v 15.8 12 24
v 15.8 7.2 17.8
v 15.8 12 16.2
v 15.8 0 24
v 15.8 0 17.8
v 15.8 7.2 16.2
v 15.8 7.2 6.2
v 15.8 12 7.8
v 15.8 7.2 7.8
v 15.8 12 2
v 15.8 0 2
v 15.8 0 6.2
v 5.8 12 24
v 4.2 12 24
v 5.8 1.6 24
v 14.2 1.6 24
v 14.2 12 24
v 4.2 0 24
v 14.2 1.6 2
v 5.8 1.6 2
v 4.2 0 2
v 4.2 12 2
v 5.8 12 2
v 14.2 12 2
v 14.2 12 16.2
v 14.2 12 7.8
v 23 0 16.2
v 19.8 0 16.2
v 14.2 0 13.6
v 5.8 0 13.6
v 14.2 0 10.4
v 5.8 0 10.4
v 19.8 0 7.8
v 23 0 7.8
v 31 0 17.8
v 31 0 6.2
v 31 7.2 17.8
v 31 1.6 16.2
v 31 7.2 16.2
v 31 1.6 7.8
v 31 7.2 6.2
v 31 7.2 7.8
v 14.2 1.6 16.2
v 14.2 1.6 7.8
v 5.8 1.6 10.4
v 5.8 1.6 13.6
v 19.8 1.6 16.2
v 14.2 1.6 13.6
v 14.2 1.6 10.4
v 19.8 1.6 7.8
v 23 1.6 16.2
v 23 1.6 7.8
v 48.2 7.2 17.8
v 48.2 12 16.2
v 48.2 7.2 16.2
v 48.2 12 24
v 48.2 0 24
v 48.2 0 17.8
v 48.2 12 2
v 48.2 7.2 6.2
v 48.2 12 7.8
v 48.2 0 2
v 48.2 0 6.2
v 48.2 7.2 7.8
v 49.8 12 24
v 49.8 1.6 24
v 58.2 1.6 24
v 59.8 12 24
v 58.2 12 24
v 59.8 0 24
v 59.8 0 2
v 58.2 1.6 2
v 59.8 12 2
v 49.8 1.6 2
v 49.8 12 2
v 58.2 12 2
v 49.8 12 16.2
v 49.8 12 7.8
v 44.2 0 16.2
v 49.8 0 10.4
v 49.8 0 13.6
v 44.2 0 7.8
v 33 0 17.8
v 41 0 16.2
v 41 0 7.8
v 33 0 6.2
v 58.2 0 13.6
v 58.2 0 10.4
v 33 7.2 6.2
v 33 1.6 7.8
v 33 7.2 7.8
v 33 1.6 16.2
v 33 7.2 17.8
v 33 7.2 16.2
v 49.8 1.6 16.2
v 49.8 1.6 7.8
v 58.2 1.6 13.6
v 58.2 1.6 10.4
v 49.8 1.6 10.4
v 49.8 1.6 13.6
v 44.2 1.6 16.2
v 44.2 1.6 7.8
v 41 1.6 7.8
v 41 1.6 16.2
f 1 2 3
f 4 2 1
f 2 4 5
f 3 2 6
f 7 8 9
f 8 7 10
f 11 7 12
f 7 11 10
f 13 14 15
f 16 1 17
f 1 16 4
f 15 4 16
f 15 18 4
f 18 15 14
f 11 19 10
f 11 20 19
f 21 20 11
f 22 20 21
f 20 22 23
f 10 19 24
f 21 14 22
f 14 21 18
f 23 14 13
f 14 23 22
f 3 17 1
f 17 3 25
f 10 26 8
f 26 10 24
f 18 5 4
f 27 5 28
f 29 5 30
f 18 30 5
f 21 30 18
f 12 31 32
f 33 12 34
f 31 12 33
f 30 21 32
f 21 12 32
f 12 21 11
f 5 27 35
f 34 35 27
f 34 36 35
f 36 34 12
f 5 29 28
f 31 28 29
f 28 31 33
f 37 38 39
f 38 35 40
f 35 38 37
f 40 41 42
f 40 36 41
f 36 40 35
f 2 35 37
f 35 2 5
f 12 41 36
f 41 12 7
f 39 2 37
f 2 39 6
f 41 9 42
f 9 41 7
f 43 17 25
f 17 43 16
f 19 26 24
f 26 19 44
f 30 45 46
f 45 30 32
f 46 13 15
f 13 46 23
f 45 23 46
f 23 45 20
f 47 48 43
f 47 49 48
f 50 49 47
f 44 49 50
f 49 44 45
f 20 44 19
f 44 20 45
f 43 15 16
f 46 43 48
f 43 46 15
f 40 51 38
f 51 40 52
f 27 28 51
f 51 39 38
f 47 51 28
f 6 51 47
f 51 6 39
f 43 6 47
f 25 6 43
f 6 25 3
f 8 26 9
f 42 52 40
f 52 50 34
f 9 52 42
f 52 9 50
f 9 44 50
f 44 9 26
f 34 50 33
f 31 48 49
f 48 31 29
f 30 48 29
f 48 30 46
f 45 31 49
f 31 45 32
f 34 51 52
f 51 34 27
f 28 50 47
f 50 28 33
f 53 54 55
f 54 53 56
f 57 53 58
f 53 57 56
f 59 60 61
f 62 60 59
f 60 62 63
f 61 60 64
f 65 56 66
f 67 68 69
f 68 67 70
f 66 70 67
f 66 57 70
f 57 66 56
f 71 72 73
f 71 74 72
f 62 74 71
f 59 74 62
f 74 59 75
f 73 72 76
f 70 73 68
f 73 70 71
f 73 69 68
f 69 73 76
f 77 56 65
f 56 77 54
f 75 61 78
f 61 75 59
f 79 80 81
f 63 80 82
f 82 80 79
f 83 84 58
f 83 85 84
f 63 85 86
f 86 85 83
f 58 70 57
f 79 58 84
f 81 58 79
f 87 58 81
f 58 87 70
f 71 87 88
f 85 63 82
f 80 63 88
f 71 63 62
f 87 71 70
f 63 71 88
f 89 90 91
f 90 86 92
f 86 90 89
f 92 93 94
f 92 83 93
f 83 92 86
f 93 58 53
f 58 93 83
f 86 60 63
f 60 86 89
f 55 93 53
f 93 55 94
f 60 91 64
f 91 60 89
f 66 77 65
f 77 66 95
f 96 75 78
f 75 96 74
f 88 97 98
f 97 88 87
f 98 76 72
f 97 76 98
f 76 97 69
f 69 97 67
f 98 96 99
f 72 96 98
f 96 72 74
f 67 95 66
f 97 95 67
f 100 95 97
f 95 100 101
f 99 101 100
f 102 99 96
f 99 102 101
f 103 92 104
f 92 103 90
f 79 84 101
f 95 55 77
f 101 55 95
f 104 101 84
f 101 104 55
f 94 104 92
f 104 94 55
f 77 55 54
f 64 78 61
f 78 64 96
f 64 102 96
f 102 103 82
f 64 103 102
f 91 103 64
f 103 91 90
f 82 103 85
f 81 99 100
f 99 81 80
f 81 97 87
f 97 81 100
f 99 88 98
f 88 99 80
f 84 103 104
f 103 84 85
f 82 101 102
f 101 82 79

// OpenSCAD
// file: ../params.scad
// Общие размеры первой итерации: один отсек 3.5" и детали вокруг него.
// Корпус диска — SFF-8301, таблица 3-1, класс высоты 26.10 мм (максимум).
// Положение разъёма SATA сюда не зашито: его снимают калибром gauge.scad
// с конкретного диска и только потом переносят в окно салазок.

drive_width = 101.60;
drive_height = 26.10;
drive_length = 147.00;

wall = 4.0;
floor_t = 4.0;
lip_t = 3.0;
nib = 4.0;
side_clearance = 0.8;
top_clearance = 1.5;

front_gap = 3.0;
plate_t = 8.0;
front_extra = front_gap + plate_t;

pusher_d = 4.4;
m3_clear = 3.4;
m3_pilot = 2.6;
m3_nut_af = 5.5;
m3_nut_t = 2.8;

cavity_w = drive_width + side_clearance;
outer_w = cavity_w + 2 * wall;
wall_h = drive_height + top_clearance;
body_z = drive_length + front_extra;

strap_z = 18;
strap_t = 4.0;
strap_foot = 14.0;

plate_screw_x = [14, drive_width - 14];
plate_z0 = drive_length + front_gap;
plate_screw_z = plate_z0 + plate_t / 2;
plate_bar_h = 10;
tower_w = 28;
tower_x = drive_width / 2 - tower_w / 2;

sled_w = 78;
sled_h = 48;
sled_t = 8;
sled_window_w = 50;
sled_window_h = 18;
sled_hole_inset = 6;

// Каркас 1U. Шаг EIA — 44.45 мм, уголок 44.0 мм, чтобы соседний юнит не тёрся.
// Гнездо 8.4 мм принимает трубку до 8 мм. Хомут тянет её к внешней стенке гнезда.
// При rod_d = 6 между трубками 29 мм: пол корзины 1.6 мм, диск 26.1 мм, воздух ~1 мм.
// При 8 мм диск 26.1 мм в этот юнит уже не входит.
unit_h = 44.0;
rod_d = 6;
socket_d = 8.4;
// 10 мм хватает, чтобы трубка села и хомут её зажал. Столбик тогда 12 мм,
// и четыре корзины остаются внутри просвета 450 мм.
socket_depth = 10;
socket_wall = 1.6;
skin = 0.8;
foot = 1.6;
roof = 1.4;
tie_w = 3.2;
// Просвет между направляющими стойки 19 дюймов — 450 мм.
opening_w = 450;
bay_count = 4;
bay_gap = 1.0;
basket_wall = 1.6;
basket_clear = 0.6;
rail_t = 1.6;
// Торец разъёма выступает за ближнюю трубку к каретке, чтобы трубка не перекрыла SATA.
plug_overhang = 16;
stop_margin = 14;

socket_r = socket_d / 2;
post_x = socket_depth + 2;
axis_inset = skin + socket_r;
bottom_axis_y = foot + socket_r;
top_axis_y = unit_h - roof - socket_r;
depth_z0 = axis_inset + socket_r + socket_wall;
post_z = depth_z0 + socket_depth;
basket_w = drive_width + basket_clear + 2 * basket_wall;
inner_w = bay_count * basket_w + (bay_count - 1) * bay_gap;
frame_w = inner_w + 2 * post_x;
rod_span = drive_length - plug_overhang + stop_margin;
frame_depth = rod_span + 2 * axis_inset;
rod_y0 = foot + rod_d / 2;
rod_y1 = unit_h - roof - rod_d / 2;
rod_gap = (rod_y1 - rod_d / 2) - (rod_y0 + rod_d / 2);

// KW11-3Z: корпус около 19.8 x 10.2 x 6.4 мм, два отверстия 2.35–2.5 мм
// с шагом 9.5 мм под винты M2.
switch_hole_d = 2.5;
switch_pitch = 9.5;

$fn = 32;
// file: params.scad
// Наборный ярус. Стоит рядом с cad/rack.scad и ту стойку не заменяет.
// Диск, юнит, гнездо 8.4 мм и ширина четырёх отсеков — из ../params.scad.
// Здесь их не копируют: если правка там, ярус подхватит её сам.
include <../params.scad>

$fn = 32;

// Сборка на трубке 6 мм. Гнездо принимает и 8 мм, но тогда диск 26.1 мм
// в юнит 44 мм уже не входит: между трубками остаётся около 29 мм.
m4_clear = 4.4;
board_t = 1.6;
standoff_h = 6;
comp_max = 10;
tray_t = 2.4;
tie_hole = 3.6;

// Плата Pi 4: 85 × 56 мм. Отверстия Ø2.7 под M2.5, шаг 58 × 49,
// отступ 3.5 от левого края и от обеих кромок стороны 56 мм.
// Чертёж Raspberry Pi Ltd RP-008343-DS-1. В пластике проход 2.9 мм.
// https://pip-assets.raspberrypi.com/categories/545-raspberry-pi-4-model-b/documents/RP-008343-DS-1-raspberry-pi-4-mechanical-drawing.pdf
pi_l = 85;
pi_w = 56;
pi_hole_d = 2.9;
pi_pitch_x = 58;
pi_pitch_y = 49;
pi_inset = 3.5;

sata_l = 100;
sata_w = 80;
ctrl_l = 100;
ctrl_w = 100;

// Шпилька M4 не встаёт рядом с гнездом в столбике 12 мм,
// а столбик шире раздвигает каркас за просвет 450 мм.
// Поэтому колодец шпильки — в переднем блоке, гнёзда за ним по глубине.
rod_hole_x = post_x / 2;
rod_hole_z = 5;
socket_gap = 1.6;

width_axis_z = rod_hole_z + m4_clear / 2 + socket_gap + socket_r;
depth_bore_z = width_axis_z + socket_r + socket_gap;
stack_post_z = depth_bore_z + socket_depth;
depth_axis_x = post_x / 2;

// Ложемент. Его z = 0 — передний край ушка.
ear_past = rod_d / 2 + 4;
cradle_lip_t = 2.4;
cradle_cheek_t = 2.4;
cradle_cheek = 4;
cradle_gap_tube = 1.0;
cradle_rear_inset = 22;
cradle_lip_h = 8;

cradle_z_front = ear_past;
cradle_z_drive0 = cradle_z_front + rod_d / 2 + cradle_gap_tube + cradle_lip_t;
cradle_z_drive1 = cradle_z_drive0 + drive_length;
cradle_z_rear = cradle_z_drive1 - cradle_rear_inset;
cradle_z_end = cradle_z_drive1 + cradle_cheek_t;

// Передняя трубка яруса совпадает с гнездом уголка.
cradle_z0 = width_axis_z - cradle_z_front;
drive_z0 = cradle_z0 + cradle_z_drive0;
drive_z1 = cradle_z0 + cradle_z_drive1;
mid_rail_z = cradle_z0 + cradle_z_rear;
cradle_y = rod_y0 + rod_d / 2;

// Задний отсек: кабели и платы лёжа. Договор просит не меньше 90 мм.
// Контрольная плата 100 мм, поэтому между осями трубок лотка 120 мм.
cable_gap = 36;
tray_span = 120;
bay_rail_z = drive_z1 + cable_gap;
rear_width_z = bay_rail_z + tray_span;
stack_depth = rear_width_z + width_axis_z;
tray_len = tray_span + 2 * ear_past;
tray_z0 = bay_rail_z - ear_past;

width_tube_len = frame_w - 2 * (post_x - socket_depth);
depth_tube_len = stack_depth - 2 * depth_bore_z;
rail_end_gap = 0.4;
rail_x0 = depth_axis_x + rod_d / 2 + rail_end_gap;
cross_tube_len = frame_w - 2 * rail_x0;

// Хомут рельса. Оси локальные, сборка совмещает их с трубками.
clamp_dx = 10;
clamp_cz = 12;

stud_extra = 16;
ear_out = 16;
ear_t = 3.2;

sata_tray_w = sata_l + 16;
ctrl_tray_w = ctrl_l + 16;
pi_tray_w = pi_l + 16;

bay_clear = (rear_width_z - rod_d / 2) - drive_z1;
board_stack = tray_t + standoff_h + board_t + comp_max;
// main file
// Хомут Т-стыка: боковая трубка и конец поперечины.
// Подошвой вниз, каналы сверху. Порог под каналом 1.6 мм, прорезь уже трубки.
// В STL левый и правый — печатать файл дважды на ярус (четыре стыка).
// Ложемент на трубку не запирает отдельной клипсой: у него свои отверстия под хомут.
include <params.scad>

module rail_clamp() {
    ch = socket_d;
    floor_y = foot;
    stop_x = clamp_dx + rod_d / 2 + rail_end_gap;
    pocket = 16;
    tall = 12;
    low = cradle_y - 0.4;
    x0 = clamp_dx - ch / 2 - 1.6;
    z0 = 2;

    difference() {
        union() {
            translate([x0, 0, z0])
                cube([ch + 3.2, tall, 22]);
            translate([stop_x - 0.2, 0, clamp_cz - ch / 2 - 1.6])
                cube([pocket + 1.8, low, ch + 3.2]);
        }

        translate([clamp_dx - ch / 2, floor_y, 0])
            cube([ch, tall, 28]);
        translate([stop_x, floor_y, clamp_cz - ch / 2])
            cube([pocket + 2, tall, ch]);

        translate([clamp_dx - ch / 2, -0.2, clamp_cz - tie_w / 2])
            cube([ch, floor_y + 1.4, tie_w]);
        translate([stop_x + pocket / 2 - tie_w / 2, -0.2, clamp_cz - ch / 2])
            cube([tie_w, floor_y + 1.4, ch]);
    }
}

rail_clamp();
translate([64, 0, 0])
    mirror([1, 0, 0])
        rail_clamp();
